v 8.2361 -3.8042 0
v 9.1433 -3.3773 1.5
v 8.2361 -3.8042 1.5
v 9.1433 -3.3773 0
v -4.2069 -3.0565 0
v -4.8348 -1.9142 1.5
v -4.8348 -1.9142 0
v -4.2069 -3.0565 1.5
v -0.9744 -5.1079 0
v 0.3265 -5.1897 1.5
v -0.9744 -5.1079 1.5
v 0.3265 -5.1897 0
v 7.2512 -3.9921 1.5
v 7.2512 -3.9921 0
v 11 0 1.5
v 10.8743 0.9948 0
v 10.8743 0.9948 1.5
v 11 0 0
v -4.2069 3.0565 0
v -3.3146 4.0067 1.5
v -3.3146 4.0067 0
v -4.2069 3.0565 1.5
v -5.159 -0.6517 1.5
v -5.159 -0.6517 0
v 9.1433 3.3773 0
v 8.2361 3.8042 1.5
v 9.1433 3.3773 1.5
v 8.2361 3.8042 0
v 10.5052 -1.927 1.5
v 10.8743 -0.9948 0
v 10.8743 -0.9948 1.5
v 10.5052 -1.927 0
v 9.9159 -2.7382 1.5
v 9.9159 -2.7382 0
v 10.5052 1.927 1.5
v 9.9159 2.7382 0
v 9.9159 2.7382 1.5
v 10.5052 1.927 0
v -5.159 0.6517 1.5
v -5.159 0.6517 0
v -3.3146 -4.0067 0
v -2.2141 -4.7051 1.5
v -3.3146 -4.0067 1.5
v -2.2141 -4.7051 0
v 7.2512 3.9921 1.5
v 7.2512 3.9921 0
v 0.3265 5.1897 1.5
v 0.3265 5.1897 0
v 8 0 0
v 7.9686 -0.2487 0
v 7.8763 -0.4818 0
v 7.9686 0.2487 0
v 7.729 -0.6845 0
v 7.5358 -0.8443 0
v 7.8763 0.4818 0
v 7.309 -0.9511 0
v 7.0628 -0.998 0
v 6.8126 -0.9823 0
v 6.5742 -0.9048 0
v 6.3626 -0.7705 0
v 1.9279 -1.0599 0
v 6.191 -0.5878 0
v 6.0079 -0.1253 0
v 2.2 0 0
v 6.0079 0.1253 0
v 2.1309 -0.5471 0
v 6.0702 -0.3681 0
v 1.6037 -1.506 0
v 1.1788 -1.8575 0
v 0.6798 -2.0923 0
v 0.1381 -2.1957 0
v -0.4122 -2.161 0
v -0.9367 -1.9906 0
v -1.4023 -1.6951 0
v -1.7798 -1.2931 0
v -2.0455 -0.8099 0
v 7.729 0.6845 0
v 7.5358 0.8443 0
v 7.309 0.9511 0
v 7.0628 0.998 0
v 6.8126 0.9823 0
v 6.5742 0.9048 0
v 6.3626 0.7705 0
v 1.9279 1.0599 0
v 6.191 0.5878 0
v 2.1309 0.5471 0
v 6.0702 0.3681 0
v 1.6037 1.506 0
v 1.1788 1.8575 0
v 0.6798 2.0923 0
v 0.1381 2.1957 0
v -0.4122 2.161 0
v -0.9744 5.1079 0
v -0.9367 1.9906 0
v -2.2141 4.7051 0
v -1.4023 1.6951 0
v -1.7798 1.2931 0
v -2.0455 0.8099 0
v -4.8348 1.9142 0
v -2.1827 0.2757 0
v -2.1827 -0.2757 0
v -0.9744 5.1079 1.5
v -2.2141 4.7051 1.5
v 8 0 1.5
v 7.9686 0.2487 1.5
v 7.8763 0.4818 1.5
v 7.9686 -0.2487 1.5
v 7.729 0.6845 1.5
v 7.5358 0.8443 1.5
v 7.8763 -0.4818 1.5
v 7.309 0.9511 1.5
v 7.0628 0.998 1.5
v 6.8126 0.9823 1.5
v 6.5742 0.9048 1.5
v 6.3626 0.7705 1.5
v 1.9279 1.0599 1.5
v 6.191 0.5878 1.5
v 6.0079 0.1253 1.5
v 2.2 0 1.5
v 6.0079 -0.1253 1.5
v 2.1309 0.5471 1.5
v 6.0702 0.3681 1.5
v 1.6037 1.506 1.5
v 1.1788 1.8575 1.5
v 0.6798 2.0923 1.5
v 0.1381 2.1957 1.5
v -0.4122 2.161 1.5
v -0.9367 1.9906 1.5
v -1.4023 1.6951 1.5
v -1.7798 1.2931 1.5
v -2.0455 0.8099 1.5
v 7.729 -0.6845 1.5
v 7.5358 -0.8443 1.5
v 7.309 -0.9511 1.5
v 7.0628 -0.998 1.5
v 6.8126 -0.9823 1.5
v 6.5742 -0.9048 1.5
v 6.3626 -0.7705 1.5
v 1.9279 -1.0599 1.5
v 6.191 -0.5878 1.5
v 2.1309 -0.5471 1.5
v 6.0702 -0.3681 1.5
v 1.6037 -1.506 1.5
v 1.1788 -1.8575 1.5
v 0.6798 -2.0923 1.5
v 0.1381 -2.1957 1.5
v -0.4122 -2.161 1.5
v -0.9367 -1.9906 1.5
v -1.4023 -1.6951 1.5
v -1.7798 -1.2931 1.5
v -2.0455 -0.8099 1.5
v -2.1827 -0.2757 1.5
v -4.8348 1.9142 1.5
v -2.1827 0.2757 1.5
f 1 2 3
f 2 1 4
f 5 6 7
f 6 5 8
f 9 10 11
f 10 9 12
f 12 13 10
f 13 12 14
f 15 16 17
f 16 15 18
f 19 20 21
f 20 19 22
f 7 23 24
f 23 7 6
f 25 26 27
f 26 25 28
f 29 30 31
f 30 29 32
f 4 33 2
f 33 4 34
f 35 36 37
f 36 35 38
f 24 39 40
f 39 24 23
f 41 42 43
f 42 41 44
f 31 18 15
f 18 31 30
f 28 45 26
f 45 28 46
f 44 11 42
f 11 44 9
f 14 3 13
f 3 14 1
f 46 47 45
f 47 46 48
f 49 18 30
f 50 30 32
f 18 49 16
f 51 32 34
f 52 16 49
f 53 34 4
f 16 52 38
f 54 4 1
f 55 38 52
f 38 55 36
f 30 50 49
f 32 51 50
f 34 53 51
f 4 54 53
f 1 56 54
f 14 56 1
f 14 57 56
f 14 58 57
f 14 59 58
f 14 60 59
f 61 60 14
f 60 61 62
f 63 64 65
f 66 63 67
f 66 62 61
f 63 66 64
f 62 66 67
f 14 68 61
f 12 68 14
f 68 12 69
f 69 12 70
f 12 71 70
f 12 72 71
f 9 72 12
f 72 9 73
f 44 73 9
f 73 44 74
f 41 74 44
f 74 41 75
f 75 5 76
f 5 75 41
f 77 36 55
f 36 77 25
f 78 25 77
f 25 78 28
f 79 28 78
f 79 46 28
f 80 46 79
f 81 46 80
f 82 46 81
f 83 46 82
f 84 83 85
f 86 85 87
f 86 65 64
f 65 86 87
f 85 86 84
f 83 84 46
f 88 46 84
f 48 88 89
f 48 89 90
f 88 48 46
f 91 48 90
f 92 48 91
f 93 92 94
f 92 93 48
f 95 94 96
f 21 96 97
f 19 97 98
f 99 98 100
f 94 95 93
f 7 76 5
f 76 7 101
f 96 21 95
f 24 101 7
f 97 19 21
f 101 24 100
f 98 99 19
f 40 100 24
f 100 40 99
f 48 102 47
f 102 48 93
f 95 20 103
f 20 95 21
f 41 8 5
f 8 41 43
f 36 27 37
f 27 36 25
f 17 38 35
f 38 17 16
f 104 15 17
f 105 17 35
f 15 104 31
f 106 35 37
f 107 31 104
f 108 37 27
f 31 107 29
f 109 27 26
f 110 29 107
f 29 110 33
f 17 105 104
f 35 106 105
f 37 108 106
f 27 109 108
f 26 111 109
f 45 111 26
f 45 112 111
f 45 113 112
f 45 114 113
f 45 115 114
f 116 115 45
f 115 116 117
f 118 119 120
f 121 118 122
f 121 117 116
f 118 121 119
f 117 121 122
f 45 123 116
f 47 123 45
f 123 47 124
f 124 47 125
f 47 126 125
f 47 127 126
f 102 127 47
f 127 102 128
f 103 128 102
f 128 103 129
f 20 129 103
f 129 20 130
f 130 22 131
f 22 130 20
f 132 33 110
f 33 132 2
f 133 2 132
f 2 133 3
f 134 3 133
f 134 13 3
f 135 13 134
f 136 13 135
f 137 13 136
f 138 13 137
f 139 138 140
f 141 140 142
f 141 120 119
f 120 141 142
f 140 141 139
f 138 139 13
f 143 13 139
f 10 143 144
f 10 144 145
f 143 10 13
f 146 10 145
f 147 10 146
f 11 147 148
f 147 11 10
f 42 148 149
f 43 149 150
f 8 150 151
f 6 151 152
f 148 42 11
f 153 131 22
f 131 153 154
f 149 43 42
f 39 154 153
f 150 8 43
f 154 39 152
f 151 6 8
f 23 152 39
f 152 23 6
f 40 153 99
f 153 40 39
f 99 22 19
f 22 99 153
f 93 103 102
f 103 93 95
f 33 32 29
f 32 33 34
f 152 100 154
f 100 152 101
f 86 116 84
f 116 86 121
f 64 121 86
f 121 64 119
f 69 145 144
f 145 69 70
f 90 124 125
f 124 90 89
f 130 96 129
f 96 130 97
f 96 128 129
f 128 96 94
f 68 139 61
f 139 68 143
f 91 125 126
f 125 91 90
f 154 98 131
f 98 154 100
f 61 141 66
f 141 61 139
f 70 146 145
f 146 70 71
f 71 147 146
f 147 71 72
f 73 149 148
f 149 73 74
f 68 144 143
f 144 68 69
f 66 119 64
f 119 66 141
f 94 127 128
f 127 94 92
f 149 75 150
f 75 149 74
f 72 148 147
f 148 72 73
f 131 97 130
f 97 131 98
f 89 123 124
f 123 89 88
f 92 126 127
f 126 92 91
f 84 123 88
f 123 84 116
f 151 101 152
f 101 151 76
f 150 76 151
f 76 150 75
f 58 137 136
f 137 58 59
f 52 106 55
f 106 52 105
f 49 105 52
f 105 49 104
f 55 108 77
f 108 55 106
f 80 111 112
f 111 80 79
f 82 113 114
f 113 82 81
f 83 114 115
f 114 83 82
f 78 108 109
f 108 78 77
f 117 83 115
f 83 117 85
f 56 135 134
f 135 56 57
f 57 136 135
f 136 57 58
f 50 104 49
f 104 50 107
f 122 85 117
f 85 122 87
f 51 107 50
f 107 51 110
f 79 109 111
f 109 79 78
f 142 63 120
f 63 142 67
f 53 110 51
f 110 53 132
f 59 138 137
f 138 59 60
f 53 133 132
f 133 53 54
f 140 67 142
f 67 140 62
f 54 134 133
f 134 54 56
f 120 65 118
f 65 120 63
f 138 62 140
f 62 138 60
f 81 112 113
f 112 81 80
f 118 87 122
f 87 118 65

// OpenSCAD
$fn=25;

wall_thk = 3;

ring_id = 4.4;
ring_od = ring_id + 2*wall_thk;

string_hole_id = 2;
string_hole_od = string_hole_id + 2*wall_thk;


thk = 1.5;
hole_centres = 7;

difference()
{
hull()
{
    cylinder(d=ring_od,h=thk);
    translate([hole_centres,0,0])
    cylinder(d=string_hole_od,h=thk);
}

    cylinder(d=ring_id,h=thk);
    translate([hole_centres,0,0])
        cylinder(d=string_hole_id,h=thk);
}
